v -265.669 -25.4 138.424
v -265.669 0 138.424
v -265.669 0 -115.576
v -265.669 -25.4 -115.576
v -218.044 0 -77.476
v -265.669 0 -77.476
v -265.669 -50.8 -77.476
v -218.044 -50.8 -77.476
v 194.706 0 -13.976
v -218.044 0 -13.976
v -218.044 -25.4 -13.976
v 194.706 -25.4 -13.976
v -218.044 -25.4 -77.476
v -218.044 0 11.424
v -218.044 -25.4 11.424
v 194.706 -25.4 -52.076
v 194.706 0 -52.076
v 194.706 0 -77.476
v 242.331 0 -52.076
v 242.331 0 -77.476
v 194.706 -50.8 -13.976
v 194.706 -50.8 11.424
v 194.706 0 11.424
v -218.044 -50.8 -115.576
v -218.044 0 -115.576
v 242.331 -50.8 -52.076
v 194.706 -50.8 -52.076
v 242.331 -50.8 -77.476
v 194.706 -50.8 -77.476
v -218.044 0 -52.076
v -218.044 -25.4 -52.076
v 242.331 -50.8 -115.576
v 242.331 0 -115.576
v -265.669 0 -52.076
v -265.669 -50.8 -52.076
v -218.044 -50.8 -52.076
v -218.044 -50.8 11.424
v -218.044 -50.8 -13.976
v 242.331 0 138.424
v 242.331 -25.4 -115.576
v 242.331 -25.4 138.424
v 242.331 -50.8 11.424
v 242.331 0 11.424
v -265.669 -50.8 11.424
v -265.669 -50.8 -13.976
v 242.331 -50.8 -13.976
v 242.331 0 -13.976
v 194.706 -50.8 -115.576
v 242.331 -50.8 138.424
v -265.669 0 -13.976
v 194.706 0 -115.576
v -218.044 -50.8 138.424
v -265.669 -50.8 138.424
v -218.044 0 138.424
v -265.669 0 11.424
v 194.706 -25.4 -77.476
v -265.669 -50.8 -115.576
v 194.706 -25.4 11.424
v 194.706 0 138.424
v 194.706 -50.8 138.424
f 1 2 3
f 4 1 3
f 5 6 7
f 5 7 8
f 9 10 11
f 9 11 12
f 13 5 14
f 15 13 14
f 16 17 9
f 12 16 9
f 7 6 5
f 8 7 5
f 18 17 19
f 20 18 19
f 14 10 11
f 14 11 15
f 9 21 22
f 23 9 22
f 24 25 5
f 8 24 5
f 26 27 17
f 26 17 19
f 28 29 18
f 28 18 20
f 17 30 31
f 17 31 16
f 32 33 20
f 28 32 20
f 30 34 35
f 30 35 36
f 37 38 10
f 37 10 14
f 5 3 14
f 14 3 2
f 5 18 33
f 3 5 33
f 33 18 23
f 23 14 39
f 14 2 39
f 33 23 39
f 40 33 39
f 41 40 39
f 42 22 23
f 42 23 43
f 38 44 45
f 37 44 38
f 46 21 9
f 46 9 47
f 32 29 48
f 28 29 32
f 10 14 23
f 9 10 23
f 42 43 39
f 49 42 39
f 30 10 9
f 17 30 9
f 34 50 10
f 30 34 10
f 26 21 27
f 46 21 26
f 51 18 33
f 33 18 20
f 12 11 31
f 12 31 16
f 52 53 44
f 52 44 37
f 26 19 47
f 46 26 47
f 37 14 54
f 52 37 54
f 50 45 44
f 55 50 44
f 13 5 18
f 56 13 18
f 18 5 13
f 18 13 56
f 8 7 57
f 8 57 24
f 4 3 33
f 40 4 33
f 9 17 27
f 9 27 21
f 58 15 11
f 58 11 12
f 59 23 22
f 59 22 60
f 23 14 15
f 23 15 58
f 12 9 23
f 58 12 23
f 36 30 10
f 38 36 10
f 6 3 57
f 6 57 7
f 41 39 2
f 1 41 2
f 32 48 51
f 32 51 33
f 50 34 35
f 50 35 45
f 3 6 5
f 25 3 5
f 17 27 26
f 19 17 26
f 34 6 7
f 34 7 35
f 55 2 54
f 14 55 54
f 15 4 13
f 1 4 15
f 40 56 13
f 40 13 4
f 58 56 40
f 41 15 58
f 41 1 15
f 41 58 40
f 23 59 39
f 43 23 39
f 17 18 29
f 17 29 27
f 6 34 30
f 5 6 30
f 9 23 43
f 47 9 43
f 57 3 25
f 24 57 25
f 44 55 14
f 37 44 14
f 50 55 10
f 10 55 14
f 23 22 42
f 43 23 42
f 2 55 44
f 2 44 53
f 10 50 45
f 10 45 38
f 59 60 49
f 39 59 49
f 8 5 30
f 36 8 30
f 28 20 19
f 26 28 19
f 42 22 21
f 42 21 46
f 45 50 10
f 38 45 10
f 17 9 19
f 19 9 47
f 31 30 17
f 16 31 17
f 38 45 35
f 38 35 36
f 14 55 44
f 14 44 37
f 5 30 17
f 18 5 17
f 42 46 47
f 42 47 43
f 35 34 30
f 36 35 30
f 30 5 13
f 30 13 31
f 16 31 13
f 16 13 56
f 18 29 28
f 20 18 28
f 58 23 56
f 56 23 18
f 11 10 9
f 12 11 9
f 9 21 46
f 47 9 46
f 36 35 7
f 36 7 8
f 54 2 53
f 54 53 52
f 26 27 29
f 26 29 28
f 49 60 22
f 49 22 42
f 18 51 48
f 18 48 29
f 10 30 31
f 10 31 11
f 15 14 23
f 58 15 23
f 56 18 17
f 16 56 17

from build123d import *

# Parameters (mm, degrees)
F0_W      = 47.625
F0_H      = 38.1
F0_H_2    = 25.4
F0_H_3    = 127
F0_W_2    = 412.75
F1_DEPTH  = 25.4
F2_DEPTH  = 50.8
F3_DEPTH  = 50.8
F4_DEPTH  = 50.8
F5_DEPTH  = 25.4
F6_DEPTH  = 50.8
F7_DEPTH  = 50.8
F8_DEPTH  = 25.4
F9_DEPTH  = 50.8
F10_DEPTH = 25.4


with BuildPart() as f1:
    # F0 (on Front) → F1 (new body)
    with BuildSketch(Plane.XZ):
        with Locations((218.5180362463, -33.0260505199)):
            Rectangle(F0_W, F0_H)
        with Locations((218.5180362463, -96.5260505199)):
            Rectangle(F0_W, F0_H)
        with Locations((-241.8569637537, -33.0260505199)):
            Rectangle(F0_W, F0_H)
        with Locations((218.5180362463, -64.7760505199)):
            Rectangle(F0_W, F0_H_2)
        with Locations((218.5180362463, 74.9239494801)):
            Rectangle(F0_W, F0_H_3)
        with Locations((-11.6694637537, 74.9239494801)):
            Rectangle(F0_W_2, F0_H_3)
        with Locations((-241.8569637537, -64.7760505199)):
            Rectangle(F0_W, F0_H_2)
        with Locations((218.5180362463, -1.2760505199)):
            Rectangle(F0_W, F0_H_2)
        with Locations((-241.8569637537, 74.9239494801)):
            Rectangle(F0_W, F0_H_3)
        with Locations((-11.6694637537, -96.5260505199)):
            Rectangle(F0_W_2, F0_H)
        with Locations((-241.8569637537, -1.2760505199)):
            Rectangle(F0_W, F0_H_2)
        with Locations((-241.8569637537, -96.5260505199)):
            Rectangle(F0_W, F0_H)
    extrude(amount=F1_DEPTH)


with BuildPart() as f2:
    # F0 (on Front) → F2 (new body)
    with BuildSketch(Plane.XZ):
        with Locations((-241.8569637537, 74.9239494801)):
            Rectangle(F0_W, F0_H_3)
    extrude(amount=F2_DEPTH)


with BuildPart() as f3:
    # F0 (on Front) → F3 (new body)
    with BuildSketch(Plane.XZ):
        with Locations((218.5180362463, 74.9239494801)):
            Rectangle(F0_W, F0_H_3)
    extrude(amount=F3_DEPTH)


with BuildPart() as f4:
    # F0 (on Front) → F4 (new body)
    with BuildSketch(Plane.XZ):
        with Locations((-241.8569637537, -64.7760505199)):
            Rectangle(F0_W, F0_H_2)
    extrude(amount=F4_DEPTH)


with BuildPart() as f4b:
    # F0 (on Front) → F4, piece 2 (new body)
    with BuildSketch(Plane.XZ):
        with Locations((218.5180362463, -64.7760505199)):
            Rectangle(F0_W, F0_H_2)
    extrude(amount=F4_DEPTH)


with BuildPart() as f5:
    # F0 (on Front) → F5 (new body)
    with BuildSketch(Plane.XZ):
        with Locations((-11.6694637537, -64.7760505199)):
            Rectangle(F0_W_2, F0_H_2)
    extrude(amount=F5_DEPTH)


with BuildPart() as f6:
    # F0 (on Front) → F6 (new body)
    with BuildSketch(Plane.XZ):
        with Locations((-241.8569637537, -96.5260505199)):
            Rectangle(F0_W, F0_H)
    extrude(amount=F6_DEPTH)


with BuildPart() as f6b:
    # F0 (on Front) → F6, piece 2 (new body)
    with BuildSketch(Plane.XZ):
        with Locations((218.5180362463, -96.5260505199)):
            Rectangle(F0_W, F0_H)
    extrude(amount=F6_DEPTH)


with BuildPart() as f7:
    # F0 (on Front) → F7 (new body)
    with BuildSketch(Plane.XZ):
        with Locations((-241.8569637537, -1.2760505199)):
            Rectangle(F0_W, F0_H_2)
    extrude(amount=F7_DEPTH)


with BuildPart() as f7b:
    # F0 (on Front) → F7, piece 2 (new body)
    with BuildSketch(Plane.XZ):
        with Locations((218.5180362463, -1.2760505199)):
            Rectangle(F0_W, F0_H_2)
    extrude(amount=F7_DEPTH)


with BuildPart() as f8:
    # F0 (on Front) → F8 (new body)
    with BuildSketch(Plane.XZ):
        with Locations((-11.6694637537, -1.2760505199)):
            Rectangle(F0_W_2, F0_H_2)
    extrude(amount=F8_DEPTH)


with BuildPart() as f9:
    # F0 (on Front) → F9 (new body)
    with BuildSketch(Plane.XZ):
        with Locations((-241.8569637537, -33.0260505199)):
            Rectangle(F0_W, F0_H)
    extrude(amount=F9_DEPTH)


with BuildPart() as f9b:
    # F0 (on Front) → F9, piece 2 (new body)
    with BuildSketch(Plane.XZ):
        with Locations((218.5180362463, -33.0260505199)):
            Rectangle(F0_W, F0_H)
    extrude(amount=F9_DEPTH)


with BuildPart() as f10:
    # F0 (on Front) → F10 (new body)
    with BuildSketch(Plane.XZ):
        with Locations((-11.6694637537, -33.0260505199)):
            Rectangle(F0_W_2, F0_H)
    extrude(amount=F10_DEPTH)


solid = Compound([f1.part, f2.part, f3.part, f4.part, f4b.part, f5.part, f6.part, f6b.part, f7.part, f7b.part, f8.part, f9.part, f9b.part, f10.part])
